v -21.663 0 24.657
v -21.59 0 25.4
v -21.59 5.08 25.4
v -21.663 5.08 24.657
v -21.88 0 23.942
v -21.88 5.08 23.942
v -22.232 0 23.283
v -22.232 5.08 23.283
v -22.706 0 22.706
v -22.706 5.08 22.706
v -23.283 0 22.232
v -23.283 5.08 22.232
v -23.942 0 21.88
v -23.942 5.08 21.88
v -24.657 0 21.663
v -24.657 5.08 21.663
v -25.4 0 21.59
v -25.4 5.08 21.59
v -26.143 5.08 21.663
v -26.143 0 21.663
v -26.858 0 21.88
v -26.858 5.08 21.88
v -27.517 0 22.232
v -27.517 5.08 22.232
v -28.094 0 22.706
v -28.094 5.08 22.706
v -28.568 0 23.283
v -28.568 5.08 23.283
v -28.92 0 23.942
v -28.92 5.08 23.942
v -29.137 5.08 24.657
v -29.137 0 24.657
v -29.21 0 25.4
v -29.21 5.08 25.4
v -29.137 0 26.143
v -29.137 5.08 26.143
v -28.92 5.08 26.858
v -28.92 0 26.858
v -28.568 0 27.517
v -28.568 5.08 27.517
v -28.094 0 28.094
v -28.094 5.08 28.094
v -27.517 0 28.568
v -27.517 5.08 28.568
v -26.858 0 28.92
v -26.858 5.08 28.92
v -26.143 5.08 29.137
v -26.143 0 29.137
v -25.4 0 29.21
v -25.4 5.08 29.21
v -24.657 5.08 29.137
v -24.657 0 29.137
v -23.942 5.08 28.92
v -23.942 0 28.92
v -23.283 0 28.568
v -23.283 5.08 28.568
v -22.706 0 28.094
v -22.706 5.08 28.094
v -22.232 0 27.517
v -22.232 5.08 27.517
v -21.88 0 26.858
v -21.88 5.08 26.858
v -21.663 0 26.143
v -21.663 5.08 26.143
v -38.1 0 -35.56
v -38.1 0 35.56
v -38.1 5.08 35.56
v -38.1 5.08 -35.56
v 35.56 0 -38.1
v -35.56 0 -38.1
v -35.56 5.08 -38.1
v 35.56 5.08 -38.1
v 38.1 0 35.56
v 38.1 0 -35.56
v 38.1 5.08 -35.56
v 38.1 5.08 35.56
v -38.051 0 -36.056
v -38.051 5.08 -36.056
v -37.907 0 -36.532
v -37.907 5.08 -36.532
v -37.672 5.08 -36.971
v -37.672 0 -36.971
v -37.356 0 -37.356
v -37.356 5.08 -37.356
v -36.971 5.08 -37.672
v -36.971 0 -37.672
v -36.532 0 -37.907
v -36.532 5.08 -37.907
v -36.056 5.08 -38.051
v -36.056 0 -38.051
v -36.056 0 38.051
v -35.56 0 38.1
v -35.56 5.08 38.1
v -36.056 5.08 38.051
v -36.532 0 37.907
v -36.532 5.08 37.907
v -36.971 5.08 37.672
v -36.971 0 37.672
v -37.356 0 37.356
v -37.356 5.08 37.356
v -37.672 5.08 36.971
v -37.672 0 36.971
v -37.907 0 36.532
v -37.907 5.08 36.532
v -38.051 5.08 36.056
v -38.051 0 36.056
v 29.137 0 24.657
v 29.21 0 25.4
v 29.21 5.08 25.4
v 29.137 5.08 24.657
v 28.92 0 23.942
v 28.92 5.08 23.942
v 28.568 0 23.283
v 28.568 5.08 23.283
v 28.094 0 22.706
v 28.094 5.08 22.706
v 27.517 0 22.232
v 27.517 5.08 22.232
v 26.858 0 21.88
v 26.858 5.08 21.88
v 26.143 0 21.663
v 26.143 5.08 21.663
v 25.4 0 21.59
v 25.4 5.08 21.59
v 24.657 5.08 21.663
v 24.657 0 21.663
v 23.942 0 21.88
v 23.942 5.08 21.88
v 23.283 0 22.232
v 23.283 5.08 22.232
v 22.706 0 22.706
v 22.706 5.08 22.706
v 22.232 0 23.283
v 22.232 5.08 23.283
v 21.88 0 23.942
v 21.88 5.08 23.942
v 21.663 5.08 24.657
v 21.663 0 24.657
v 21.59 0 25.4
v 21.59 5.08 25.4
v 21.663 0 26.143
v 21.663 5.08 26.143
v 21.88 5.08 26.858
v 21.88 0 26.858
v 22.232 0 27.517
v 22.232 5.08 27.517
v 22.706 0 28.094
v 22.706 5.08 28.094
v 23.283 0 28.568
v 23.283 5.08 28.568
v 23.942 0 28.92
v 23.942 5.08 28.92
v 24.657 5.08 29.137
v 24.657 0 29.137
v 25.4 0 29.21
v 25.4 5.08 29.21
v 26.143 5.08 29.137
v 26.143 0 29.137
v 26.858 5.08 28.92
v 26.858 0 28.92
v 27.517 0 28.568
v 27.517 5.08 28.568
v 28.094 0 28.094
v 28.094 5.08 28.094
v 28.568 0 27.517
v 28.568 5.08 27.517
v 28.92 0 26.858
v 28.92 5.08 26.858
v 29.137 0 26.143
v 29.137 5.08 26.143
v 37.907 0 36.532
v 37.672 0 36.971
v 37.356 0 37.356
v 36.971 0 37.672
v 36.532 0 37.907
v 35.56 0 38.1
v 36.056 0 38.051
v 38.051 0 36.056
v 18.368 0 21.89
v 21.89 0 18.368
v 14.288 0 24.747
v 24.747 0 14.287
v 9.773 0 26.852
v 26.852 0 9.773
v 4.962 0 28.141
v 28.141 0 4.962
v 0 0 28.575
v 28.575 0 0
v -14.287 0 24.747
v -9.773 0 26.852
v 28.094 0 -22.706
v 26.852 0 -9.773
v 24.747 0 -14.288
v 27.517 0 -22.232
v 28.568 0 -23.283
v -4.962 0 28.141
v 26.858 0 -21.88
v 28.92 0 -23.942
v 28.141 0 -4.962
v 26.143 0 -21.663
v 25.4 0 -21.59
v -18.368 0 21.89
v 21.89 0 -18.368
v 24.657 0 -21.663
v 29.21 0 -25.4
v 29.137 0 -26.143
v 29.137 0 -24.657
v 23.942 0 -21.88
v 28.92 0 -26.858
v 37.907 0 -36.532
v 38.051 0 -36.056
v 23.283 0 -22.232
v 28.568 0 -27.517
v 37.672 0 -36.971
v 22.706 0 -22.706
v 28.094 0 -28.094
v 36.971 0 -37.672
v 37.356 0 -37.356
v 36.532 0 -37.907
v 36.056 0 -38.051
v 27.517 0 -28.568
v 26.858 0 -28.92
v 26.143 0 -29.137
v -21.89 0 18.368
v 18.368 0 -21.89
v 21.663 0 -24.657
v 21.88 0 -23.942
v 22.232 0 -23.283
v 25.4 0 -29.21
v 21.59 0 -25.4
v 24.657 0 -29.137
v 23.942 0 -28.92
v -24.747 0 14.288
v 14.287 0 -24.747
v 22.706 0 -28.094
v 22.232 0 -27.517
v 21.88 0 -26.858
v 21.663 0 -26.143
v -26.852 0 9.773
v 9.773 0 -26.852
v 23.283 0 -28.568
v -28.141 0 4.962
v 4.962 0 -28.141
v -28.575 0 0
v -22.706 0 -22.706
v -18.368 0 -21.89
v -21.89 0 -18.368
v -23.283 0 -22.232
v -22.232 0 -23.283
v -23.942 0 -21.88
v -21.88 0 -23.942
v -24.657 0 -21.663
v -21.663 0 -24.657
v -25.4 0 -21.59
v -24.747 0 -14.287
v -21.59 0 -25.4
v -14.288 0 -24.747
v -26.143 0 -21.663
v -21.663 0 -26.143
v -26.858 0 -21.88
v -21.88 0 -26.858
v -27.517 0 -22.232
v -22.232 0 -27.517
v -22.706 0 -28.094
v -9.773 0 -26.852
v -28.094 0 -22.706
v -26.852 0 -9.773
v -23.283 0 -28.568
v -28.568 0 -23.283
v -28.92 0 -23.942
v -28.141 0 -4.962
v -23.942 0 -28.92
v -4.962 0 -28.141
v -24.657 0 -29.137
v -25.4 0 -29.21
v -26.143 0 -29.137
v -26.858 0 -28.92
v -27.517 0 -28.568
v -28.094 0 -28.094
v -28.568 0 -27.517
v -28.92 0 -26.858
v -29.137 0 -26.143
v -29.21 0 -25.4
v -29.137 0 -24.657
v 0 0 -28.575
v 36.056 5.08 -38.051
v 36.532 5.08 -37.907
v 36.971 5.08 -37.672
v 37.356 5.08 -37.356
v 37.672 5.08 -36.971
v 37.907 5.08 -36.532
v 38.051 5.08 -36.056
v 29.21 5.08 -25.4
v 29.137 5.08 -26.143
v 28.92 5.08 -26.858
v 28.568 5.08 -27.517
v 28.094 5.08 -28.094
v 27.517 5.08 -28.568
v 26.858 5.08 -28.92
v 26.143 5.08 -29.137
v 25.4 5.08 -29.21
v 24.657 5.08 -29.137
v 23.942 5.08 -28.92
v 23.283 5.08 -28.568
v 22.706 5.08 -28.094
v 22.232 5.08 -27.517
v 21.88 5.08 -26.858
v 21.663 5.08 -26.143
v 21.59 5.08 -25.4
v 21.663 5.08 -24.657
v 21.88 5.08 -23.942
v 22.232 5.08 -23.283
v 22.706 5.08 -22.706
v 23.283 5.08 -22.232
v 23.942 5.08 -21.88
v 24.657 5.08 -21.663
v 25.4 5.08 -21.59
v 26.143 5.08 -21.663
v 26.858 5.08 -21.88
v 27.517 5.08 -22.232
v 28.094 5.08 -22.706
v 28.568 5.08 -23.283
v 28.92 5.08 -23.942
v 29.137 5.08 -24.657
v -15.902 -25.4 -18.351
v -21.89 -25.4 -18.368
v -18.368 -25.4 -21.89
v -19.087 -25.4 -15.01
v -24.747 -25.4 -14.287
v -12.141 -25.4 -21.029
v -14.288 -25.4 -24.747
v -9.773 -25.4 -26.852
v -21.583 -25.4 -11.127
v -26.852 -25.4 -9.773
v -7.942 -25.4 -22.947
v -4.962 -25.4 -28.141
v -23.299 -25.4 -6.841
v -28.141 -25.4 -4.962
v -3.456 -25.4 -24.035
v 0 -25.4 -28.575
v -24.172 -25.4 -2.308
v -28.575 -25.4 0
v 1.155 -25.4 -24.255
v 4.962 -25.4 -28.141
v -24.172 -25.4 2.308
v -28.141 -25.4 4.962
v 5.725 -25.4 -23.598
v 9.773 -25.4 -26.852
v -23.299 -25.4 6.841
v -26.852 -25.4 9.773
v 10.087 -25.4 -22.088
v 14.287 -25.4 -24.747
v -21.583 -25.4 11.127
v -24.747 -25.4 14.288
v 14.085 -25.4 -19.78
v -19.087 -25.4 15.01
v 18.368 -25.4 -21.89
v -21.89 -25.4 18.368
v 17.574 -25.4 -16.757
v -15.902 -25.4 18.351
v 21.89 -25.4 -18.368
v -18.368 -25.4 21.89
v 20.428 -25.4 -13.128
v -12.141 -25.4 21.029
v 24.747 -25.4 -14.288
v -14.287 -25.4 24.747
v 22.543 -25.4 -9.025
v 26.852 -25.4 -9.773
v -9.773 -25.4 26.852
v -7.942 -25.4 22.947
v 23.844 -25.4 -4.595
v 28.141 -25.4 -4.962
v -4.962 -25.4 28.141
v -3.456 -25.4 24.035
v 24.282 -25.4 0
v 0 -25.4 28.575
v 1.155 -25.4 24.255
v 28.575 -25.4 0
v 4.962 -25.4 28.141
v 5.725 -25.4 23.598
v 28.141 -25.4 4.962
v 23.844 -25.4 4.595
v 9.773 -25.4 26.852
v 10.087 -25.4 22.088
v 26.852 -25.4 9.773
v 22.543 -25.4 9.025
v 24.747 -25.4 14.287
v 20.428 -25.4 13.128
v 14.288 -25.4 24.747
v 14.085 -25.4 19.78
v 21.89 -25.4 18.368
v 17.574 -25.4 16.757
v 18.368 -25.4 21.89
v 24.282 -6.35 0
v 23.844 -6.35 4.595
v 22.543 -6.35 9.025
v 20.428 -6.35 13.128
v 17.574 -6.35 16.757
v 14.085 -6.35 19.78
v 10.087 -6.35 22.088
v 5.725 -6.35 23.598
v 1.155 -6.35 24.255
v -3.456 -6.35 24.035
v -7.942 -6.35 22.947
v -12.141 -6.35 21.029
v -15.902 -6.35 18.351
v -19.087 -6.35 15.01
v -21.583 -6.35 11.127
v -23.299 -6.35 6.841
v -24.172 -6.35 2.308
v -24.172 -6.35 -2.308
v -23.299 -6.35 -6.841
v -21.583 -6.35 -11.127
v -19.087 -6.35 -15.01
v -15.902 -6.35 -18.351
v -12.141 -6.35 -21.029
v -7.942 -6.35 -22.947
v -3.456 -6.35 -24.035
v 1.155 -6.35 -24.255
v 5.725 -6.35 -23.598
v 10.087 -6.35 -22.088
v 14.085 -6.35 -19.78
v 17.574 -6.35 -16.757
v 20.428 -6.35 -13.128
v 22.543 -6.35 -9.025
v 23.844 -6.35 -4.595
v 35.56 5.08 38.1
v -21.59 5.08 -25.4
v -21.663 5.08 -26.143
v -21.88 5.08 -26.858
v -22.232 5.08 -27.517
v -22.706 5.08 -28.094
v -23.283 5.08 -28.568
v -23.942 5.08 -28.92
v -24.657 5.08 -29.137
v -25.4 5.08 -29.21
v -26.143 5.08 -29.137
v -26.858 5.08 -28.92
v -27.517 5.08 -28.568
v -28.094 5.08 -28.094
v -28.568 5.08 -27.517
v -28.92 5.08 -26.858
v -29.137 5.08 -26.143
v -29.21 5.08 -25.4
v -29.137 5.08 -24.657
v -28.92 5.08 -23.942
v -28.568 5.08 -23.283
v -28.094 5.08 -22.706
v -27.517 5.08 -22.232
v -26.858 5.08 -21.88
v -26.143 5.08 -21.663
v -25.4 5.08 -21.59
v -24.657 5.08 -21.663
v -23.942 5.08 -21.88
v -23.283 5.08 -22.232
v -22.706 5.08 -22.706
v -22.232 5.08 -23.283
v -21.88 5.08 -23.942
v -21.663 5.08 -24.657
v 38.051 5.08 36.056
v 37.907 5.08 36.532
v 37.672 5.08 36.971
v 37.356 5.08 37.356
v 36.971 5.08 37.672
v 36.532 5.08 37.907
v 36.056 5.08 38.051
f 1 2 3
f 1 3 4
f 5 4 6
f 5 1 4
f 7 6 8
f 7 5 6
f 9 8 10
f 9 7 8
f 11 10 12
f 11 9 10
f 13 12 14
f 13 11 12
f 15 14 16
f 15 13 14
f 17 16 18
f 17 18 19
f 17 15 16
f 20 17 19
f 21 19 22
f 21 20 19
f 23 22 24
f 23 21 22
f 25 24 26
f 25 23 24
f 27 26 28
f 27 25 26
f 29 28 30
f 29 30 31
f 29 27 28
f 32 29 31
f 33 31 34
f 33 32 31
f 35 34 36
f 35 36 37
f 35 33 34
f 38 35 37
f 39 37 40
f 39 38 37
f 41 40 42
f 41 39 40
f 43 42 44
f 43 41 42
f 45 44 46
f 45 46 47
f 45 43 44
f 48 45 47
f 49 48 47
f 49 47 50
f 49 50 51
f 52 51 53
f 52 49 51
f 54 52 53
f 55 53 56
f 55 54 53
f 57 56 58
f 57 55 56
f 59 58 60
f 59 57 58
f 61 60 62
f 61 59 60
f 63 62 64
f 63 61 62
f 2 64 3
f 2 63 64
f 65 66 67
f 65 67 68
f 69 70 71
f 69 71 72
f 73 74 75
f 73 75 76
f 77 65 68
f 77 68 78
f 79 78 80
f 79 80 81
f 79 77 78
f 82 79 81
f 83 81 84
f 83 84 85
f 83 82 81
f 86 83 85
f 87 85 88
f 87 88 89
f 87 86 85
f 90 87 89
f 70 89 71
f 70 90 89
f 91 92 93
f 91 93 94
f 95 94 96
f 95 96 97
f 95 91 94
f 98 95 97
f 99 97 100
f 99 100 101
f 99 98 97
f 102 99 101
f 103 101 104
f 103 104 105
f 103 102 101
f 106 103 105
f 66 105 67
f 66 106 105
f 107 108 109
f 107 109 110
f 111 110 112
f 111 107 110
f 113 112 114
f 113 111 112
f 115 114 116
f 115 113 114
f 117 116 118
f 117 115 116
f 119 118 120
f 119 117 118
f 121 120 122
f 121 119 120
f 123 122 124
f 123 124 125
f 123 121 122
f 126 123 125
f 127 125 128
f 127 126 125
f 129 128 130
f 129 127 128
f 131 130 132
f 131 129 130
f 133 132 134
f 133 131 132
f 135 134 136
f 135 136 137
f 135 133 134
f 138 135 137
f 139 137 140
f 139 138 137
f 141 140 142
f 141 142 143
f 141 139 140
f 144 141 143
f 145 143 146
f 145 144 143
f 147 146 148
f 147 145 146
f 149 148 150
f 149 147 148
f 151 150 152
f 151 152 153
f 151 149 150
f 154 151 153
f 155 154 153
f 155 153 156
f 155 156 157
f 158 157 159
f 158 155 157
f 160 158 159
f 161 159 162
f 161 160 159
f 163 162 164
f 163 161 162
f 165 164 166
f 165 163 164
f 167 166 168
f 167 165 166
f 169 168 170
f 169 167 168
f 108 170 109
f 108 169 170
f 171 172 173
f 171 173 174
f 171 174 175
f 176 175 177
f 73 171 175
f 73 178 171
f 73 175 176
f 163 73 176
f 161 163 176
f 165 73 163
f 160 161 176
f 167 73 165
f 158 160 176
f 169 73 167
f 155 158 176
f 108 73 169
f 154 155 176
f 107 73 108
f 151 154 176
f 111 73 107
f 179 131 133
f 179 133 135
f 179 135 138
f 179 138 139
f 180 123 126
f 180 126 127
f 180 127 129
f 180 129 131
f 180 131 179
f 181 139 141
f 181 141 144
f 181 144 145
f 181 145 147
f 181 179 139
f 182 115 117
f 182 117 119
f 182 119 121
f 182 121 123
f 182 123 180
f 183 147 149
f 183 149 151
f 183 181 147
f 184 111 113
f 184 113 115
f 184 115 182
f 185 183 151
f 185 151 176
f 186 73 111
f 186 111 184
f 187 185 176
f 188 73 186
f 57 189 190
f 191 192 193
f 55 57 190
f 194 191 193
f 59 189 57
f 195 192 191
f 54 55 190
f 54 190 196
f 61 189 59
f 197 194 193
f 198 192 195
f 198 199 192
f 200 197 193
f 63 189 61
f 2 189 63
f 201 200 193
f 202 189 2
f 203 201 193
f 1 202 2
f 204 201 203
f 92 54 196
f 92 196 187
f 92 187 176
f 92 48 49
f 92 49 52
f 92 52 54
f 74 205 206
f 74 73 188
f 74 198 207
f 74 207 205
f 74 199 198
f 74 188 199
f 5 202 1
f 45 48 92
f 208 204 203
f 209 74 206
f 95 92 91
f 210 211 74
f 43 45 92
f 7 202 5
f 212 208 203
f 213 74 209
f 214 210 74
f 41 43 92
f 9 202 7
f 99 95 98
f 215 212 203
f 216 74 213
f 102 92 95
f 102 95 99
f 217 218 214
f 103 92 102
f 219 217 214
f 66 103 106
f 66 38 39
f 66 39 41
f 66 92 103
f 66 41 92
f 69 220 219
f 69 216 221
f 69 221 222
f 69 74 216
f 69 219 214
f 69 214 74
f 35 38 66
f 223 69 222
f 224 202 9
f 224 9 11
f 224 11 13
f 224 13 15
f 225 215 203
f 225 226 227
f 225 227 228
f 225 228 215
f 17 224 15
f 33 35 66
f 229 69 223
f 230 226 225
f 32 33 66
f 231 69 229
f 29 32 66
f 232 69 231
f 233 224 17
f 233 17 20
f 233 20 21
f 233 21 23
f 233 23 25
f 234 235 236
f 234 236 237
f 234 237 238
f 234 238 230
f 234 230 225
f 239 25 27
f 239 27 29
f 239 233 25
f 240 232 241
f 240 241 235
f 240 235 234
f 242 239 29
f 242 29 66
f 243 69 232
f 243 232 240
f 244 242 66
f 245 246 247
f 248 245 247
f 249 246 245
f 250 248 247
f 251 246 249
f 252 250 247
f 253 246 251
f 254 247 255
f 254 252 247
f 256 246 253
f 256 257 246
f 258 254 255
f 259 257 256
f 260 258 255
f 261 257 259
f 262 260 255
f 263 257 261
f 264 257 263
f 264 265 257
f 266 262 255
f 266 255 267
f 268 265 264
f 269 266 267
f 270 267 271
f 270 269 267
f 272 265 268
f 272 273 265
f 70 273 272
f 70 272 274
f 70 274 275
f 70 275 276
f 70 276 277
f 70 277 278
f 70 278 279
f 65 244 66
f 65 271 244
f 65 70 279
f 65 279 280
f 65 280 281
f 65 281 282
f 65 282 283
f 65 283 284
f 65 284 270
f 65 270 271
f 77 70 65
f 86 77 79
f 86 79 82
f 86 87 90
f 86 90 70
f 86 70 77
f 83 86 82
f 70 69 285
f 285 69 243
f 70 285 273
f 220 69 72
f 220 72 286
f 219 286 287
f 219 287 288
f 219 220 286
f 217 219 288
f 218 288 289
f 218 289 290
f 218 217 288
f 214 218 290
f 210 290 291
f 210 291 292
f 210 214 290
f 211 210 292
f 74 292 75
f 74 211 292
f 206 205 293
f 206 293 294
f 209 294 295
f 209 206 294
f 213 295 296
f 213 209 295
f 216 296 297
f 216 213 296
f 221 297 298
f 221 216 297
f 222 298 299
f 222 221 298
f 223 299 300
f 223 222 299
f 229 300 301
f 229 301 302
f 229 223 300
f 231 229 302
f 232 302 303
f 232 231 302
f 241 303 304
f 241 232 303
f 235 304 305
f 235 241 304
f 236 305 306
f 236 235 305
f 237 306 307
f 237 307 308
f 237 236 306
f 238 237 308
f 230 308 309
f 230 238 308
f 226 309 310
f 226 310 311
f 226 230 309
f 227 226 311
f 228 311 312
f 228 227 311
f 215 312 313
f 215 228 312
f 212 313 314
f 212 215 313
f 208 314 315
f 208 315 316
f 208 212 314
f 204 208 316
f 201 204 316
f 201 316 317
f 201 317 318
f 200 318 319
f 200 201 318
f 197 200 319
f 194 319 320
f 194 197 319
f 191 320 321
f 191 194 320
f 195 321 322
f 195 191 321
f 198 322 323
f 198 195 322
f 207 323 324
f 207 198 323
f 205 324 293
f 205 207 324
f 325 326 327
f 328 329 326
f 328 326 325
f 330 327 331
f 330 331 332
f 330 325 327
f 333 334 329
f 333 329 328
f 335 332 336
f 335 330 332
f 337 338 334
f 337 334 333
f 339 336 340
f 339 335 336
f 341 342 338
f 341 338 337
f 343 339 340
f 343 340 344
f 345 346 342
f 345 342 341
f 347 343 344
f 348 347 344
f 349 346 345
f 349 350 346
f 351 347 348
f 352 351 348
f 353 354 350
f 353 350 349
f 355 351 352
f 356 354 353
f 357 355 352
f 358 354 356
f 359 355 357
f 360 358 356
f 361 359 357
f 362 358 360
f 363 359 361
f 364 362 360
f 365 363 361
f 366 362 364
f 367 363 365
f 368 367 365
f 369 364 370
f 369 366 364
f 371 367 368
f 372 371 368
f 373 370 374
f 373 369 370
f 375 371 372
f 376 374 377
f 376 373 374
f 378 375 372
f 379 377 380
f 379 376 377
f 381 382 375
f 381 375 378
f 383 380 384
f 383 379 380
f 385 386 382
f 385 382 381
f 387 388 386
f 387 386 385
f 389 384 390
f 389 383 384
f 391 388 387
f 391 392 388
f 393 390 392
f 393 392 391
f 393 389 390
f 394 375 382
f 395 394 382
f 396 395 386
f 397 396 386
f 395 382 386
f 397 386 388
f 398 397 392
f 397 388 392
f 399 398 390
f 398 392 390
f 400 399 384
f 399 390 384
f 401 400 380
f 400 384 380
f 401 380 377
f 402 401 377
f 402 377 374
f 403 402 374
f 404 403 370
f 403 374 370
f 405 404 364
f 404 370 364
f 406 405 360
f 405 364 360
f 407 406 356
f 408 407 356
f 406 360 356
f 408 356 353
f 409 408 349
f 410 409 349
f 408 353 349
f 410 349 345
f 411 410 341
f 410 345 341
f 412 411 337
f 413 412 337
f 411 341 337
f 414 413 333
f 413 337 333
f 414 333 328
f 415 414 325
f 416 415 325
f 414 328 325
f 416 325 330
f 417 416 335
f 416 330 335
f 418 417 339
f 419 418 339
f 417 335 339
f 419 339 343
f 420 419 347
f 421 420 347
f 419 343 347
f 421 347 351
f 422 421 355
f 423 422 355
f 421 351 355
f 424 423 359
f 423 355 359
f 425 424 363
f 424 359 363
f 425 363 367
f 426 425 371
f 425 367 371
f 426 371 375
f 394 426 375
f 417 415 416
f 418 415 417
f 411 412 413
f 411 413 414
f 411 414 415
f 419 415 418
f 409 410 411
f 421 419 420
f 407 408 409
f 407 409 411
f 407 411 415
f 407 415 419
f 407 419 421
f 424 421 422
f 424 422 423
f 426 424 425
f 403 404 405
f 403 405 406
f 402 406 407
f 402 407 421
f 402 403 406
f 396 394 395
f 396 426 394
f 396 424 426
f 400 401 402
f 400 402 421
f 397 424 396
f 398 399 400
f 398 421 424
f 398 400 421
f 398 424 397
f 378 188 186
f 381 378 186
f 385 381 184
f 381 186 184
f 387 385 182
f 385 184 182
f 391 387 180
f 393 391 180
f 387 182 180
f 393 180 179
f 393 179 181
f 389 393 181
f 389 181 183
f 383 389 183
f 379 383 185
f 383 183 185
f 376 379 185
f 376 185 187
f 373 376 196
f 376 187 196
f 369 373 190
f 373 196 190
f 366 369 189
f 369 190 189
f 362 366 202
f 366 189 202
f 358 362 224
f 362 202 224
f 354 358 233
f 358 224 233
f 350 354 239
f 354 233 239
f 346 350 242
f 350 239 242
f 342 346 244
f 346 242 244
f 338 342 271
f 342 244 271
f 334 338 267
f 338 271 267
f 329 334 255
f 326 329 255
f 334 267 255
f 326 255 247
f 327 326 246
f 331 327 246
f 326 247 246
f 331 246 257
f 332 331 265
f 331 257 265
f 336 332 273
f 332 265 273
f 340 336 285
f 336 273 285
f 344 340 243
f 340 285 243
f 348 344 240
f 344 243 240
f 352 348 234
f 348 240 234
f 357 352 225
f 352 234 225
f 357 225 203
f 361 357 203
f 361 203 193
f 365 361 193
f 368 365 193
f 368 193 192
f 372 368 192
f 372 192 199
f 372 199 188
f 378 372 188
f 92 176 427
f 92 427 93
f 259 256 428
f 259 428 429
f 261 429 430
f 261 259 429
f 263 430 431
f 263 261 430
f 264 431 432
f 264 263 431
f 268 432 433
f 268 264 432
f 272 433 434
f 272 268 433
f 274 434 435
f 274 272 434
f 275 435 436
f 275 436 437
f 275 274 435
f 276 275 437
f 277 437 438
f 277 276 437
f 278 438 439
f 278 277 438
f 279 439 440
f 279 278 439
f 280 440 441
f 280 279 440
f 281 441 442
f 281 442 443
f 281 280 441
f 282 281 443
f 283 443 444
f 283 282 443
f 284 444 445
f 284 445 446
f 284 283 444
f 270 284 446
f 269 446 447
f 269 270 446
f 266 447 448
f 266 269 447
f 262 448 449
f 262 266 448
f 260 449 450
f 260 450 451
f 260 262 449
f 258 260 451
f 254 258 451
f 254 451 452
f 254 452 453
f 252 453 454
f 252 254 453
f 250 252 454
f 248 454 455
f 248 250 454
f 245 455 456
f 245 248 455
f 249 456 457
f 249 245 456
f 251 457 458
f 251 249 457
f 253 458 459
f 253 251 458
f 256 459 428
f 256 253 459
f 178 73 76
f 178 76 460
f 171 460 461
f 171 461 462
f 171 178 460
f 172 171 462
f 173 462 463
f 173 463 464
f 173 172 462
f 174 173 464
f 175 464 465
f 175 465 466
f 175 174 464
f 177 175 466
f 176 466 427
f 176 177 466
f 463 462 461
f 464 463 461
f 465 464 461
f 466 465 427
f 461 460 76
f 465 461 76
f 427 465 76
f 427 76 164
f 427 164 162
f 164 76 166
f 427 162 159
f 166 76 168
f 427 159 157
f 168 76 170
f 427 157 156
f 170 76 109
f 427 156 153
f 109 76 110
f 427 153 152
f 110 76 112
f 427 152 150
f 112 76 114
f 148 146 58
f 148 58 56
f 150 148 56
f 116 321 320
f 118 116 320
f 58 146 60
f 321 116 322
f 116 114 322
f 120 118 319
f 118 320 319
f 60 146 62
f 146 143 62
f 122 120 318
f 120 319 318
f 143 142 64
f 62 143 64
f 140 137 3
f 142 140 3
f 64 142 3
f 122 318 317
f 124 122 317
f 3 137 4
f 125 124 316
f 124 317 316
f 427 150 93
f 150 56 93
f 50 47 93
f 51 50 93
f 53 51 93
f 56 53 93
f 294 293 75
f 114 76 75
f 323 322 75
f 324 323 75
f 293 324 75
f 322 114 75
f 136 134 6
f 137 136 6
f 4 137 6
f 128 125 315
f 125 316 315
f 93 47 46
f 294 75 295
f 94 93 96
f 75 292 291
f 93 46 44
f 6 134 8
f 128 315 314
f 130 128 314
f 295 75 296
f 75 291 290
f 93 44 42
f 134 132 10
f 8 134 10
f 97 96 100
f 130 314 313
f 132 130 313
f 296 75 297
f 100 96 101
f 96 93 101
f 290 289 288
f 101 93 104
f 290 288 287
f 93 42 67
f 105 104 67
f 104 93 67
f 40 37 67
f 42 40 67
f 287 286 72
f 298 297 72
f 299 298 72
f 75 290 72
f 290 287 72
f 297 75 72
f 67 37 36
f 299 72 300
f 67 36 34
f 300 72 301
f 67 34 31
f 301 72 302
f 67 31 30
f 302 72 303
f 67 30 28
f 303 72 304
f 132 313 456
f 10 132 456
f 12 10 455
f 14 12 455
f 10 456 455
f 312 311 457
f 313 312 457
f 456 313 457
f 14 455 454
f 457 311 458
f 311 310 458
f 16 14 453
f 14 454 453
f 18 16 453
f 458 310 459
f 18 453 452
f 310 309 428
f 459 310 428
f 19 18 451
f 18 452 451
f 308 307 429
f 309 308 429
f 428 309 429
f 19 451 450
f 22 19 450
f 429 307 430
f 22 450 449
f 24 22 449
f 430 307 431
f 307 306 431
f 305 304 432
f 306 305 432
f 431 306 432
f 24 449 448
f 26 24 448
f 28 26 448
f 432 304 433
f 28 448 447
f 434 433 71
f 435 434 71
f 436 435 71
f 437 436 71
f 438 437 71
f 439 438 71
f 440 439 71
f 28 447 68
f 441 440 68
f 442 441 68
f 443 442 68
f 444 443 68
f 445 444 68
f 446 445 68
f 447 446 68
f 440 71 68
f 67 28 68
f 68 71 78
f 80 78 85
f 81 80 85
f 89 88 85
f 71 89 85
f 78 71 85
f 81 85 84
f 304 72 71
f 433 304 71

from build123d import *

# Parameters (mm, degrees)
SKETCH2_R           = 3.81
BOSS_EXTRUDE1_DEPTH = 5.08
SKETCH3_R           = 28.575
BOSS_EXTRUDE2_DEPTH = 25.4
SKETCH4_R           = 24.2824
CUT_EXTRUDE1_DEPTH  = 19.05


with BuildPart() as part:
    # Sketch2 → Boss-Extrude1 (new body)
    with BuildSketch(Plane(origin=(0, 0, 0), x_dir=(1, 0, 0), z_dir=(0, 1, 0))):
        with BuildLine():
            Line((-35.56, 38.1), (35.56, 38.1))
            ThreePointArc((35.56, 38.1), (37.356051224, 37.356051224), (38.1, 35.56))
            Line((38.1, 35.56), (38.1, -35.56))
            ThreePointArc((38.1, -35.56), (37.356051224, -37.356051224), (35.56, -38.1))
            Line((35.56, -38.1), (-35.56, -38.1))
            ThreePointArc((-35.56, -38.1), (-37.356051224, -37.356051224), (-38.1, -35.56))
            Line((-38.1, -35.56), (-38.1, 35.56))
            ThreePointArc((-38.1, 35.56), (-37.356051224, 37.356051224), (-35.56, 38.1))
        make_face()
        with Locations((-25.4, 25.4)):
            Circle(SKETCH2_R, mode=Mode.SUBTRACT)
        with Locations((25.4, 25.4)):
            Circle(SKETCH2_R, mode=Mode.SUBTRACT)
        with Locations((25.4, -25.4)):
            Circle(SKETCH2_R, mode=Mode.SUBTRACT)
        with Locations((-25.4, -25.4)):
            Circle(SKETCH2_R, mode=Mode.SUBTRACT)
    extrude(amount=BOSS_EXTRUDE1_DEPTH)

    # Sketch3 → Boss-Extrude2 (add)
    with BuildSketch(Plane.XZ):
        Circle(SKETCH3_R)
    extrude(amount=BOSS_EXTRUDE2_DEPTH)

    # Sketch4 → Cut-Extrude1 (cut)
    with BuildSketch(Plane.XZ.offset(25.4)):
        Circle(SKETCH4_R)
    extrude(amount=-CUT_EXTRUDE1_DEPTH, mode=Mode.SUBTRACT)


solid = part.part
